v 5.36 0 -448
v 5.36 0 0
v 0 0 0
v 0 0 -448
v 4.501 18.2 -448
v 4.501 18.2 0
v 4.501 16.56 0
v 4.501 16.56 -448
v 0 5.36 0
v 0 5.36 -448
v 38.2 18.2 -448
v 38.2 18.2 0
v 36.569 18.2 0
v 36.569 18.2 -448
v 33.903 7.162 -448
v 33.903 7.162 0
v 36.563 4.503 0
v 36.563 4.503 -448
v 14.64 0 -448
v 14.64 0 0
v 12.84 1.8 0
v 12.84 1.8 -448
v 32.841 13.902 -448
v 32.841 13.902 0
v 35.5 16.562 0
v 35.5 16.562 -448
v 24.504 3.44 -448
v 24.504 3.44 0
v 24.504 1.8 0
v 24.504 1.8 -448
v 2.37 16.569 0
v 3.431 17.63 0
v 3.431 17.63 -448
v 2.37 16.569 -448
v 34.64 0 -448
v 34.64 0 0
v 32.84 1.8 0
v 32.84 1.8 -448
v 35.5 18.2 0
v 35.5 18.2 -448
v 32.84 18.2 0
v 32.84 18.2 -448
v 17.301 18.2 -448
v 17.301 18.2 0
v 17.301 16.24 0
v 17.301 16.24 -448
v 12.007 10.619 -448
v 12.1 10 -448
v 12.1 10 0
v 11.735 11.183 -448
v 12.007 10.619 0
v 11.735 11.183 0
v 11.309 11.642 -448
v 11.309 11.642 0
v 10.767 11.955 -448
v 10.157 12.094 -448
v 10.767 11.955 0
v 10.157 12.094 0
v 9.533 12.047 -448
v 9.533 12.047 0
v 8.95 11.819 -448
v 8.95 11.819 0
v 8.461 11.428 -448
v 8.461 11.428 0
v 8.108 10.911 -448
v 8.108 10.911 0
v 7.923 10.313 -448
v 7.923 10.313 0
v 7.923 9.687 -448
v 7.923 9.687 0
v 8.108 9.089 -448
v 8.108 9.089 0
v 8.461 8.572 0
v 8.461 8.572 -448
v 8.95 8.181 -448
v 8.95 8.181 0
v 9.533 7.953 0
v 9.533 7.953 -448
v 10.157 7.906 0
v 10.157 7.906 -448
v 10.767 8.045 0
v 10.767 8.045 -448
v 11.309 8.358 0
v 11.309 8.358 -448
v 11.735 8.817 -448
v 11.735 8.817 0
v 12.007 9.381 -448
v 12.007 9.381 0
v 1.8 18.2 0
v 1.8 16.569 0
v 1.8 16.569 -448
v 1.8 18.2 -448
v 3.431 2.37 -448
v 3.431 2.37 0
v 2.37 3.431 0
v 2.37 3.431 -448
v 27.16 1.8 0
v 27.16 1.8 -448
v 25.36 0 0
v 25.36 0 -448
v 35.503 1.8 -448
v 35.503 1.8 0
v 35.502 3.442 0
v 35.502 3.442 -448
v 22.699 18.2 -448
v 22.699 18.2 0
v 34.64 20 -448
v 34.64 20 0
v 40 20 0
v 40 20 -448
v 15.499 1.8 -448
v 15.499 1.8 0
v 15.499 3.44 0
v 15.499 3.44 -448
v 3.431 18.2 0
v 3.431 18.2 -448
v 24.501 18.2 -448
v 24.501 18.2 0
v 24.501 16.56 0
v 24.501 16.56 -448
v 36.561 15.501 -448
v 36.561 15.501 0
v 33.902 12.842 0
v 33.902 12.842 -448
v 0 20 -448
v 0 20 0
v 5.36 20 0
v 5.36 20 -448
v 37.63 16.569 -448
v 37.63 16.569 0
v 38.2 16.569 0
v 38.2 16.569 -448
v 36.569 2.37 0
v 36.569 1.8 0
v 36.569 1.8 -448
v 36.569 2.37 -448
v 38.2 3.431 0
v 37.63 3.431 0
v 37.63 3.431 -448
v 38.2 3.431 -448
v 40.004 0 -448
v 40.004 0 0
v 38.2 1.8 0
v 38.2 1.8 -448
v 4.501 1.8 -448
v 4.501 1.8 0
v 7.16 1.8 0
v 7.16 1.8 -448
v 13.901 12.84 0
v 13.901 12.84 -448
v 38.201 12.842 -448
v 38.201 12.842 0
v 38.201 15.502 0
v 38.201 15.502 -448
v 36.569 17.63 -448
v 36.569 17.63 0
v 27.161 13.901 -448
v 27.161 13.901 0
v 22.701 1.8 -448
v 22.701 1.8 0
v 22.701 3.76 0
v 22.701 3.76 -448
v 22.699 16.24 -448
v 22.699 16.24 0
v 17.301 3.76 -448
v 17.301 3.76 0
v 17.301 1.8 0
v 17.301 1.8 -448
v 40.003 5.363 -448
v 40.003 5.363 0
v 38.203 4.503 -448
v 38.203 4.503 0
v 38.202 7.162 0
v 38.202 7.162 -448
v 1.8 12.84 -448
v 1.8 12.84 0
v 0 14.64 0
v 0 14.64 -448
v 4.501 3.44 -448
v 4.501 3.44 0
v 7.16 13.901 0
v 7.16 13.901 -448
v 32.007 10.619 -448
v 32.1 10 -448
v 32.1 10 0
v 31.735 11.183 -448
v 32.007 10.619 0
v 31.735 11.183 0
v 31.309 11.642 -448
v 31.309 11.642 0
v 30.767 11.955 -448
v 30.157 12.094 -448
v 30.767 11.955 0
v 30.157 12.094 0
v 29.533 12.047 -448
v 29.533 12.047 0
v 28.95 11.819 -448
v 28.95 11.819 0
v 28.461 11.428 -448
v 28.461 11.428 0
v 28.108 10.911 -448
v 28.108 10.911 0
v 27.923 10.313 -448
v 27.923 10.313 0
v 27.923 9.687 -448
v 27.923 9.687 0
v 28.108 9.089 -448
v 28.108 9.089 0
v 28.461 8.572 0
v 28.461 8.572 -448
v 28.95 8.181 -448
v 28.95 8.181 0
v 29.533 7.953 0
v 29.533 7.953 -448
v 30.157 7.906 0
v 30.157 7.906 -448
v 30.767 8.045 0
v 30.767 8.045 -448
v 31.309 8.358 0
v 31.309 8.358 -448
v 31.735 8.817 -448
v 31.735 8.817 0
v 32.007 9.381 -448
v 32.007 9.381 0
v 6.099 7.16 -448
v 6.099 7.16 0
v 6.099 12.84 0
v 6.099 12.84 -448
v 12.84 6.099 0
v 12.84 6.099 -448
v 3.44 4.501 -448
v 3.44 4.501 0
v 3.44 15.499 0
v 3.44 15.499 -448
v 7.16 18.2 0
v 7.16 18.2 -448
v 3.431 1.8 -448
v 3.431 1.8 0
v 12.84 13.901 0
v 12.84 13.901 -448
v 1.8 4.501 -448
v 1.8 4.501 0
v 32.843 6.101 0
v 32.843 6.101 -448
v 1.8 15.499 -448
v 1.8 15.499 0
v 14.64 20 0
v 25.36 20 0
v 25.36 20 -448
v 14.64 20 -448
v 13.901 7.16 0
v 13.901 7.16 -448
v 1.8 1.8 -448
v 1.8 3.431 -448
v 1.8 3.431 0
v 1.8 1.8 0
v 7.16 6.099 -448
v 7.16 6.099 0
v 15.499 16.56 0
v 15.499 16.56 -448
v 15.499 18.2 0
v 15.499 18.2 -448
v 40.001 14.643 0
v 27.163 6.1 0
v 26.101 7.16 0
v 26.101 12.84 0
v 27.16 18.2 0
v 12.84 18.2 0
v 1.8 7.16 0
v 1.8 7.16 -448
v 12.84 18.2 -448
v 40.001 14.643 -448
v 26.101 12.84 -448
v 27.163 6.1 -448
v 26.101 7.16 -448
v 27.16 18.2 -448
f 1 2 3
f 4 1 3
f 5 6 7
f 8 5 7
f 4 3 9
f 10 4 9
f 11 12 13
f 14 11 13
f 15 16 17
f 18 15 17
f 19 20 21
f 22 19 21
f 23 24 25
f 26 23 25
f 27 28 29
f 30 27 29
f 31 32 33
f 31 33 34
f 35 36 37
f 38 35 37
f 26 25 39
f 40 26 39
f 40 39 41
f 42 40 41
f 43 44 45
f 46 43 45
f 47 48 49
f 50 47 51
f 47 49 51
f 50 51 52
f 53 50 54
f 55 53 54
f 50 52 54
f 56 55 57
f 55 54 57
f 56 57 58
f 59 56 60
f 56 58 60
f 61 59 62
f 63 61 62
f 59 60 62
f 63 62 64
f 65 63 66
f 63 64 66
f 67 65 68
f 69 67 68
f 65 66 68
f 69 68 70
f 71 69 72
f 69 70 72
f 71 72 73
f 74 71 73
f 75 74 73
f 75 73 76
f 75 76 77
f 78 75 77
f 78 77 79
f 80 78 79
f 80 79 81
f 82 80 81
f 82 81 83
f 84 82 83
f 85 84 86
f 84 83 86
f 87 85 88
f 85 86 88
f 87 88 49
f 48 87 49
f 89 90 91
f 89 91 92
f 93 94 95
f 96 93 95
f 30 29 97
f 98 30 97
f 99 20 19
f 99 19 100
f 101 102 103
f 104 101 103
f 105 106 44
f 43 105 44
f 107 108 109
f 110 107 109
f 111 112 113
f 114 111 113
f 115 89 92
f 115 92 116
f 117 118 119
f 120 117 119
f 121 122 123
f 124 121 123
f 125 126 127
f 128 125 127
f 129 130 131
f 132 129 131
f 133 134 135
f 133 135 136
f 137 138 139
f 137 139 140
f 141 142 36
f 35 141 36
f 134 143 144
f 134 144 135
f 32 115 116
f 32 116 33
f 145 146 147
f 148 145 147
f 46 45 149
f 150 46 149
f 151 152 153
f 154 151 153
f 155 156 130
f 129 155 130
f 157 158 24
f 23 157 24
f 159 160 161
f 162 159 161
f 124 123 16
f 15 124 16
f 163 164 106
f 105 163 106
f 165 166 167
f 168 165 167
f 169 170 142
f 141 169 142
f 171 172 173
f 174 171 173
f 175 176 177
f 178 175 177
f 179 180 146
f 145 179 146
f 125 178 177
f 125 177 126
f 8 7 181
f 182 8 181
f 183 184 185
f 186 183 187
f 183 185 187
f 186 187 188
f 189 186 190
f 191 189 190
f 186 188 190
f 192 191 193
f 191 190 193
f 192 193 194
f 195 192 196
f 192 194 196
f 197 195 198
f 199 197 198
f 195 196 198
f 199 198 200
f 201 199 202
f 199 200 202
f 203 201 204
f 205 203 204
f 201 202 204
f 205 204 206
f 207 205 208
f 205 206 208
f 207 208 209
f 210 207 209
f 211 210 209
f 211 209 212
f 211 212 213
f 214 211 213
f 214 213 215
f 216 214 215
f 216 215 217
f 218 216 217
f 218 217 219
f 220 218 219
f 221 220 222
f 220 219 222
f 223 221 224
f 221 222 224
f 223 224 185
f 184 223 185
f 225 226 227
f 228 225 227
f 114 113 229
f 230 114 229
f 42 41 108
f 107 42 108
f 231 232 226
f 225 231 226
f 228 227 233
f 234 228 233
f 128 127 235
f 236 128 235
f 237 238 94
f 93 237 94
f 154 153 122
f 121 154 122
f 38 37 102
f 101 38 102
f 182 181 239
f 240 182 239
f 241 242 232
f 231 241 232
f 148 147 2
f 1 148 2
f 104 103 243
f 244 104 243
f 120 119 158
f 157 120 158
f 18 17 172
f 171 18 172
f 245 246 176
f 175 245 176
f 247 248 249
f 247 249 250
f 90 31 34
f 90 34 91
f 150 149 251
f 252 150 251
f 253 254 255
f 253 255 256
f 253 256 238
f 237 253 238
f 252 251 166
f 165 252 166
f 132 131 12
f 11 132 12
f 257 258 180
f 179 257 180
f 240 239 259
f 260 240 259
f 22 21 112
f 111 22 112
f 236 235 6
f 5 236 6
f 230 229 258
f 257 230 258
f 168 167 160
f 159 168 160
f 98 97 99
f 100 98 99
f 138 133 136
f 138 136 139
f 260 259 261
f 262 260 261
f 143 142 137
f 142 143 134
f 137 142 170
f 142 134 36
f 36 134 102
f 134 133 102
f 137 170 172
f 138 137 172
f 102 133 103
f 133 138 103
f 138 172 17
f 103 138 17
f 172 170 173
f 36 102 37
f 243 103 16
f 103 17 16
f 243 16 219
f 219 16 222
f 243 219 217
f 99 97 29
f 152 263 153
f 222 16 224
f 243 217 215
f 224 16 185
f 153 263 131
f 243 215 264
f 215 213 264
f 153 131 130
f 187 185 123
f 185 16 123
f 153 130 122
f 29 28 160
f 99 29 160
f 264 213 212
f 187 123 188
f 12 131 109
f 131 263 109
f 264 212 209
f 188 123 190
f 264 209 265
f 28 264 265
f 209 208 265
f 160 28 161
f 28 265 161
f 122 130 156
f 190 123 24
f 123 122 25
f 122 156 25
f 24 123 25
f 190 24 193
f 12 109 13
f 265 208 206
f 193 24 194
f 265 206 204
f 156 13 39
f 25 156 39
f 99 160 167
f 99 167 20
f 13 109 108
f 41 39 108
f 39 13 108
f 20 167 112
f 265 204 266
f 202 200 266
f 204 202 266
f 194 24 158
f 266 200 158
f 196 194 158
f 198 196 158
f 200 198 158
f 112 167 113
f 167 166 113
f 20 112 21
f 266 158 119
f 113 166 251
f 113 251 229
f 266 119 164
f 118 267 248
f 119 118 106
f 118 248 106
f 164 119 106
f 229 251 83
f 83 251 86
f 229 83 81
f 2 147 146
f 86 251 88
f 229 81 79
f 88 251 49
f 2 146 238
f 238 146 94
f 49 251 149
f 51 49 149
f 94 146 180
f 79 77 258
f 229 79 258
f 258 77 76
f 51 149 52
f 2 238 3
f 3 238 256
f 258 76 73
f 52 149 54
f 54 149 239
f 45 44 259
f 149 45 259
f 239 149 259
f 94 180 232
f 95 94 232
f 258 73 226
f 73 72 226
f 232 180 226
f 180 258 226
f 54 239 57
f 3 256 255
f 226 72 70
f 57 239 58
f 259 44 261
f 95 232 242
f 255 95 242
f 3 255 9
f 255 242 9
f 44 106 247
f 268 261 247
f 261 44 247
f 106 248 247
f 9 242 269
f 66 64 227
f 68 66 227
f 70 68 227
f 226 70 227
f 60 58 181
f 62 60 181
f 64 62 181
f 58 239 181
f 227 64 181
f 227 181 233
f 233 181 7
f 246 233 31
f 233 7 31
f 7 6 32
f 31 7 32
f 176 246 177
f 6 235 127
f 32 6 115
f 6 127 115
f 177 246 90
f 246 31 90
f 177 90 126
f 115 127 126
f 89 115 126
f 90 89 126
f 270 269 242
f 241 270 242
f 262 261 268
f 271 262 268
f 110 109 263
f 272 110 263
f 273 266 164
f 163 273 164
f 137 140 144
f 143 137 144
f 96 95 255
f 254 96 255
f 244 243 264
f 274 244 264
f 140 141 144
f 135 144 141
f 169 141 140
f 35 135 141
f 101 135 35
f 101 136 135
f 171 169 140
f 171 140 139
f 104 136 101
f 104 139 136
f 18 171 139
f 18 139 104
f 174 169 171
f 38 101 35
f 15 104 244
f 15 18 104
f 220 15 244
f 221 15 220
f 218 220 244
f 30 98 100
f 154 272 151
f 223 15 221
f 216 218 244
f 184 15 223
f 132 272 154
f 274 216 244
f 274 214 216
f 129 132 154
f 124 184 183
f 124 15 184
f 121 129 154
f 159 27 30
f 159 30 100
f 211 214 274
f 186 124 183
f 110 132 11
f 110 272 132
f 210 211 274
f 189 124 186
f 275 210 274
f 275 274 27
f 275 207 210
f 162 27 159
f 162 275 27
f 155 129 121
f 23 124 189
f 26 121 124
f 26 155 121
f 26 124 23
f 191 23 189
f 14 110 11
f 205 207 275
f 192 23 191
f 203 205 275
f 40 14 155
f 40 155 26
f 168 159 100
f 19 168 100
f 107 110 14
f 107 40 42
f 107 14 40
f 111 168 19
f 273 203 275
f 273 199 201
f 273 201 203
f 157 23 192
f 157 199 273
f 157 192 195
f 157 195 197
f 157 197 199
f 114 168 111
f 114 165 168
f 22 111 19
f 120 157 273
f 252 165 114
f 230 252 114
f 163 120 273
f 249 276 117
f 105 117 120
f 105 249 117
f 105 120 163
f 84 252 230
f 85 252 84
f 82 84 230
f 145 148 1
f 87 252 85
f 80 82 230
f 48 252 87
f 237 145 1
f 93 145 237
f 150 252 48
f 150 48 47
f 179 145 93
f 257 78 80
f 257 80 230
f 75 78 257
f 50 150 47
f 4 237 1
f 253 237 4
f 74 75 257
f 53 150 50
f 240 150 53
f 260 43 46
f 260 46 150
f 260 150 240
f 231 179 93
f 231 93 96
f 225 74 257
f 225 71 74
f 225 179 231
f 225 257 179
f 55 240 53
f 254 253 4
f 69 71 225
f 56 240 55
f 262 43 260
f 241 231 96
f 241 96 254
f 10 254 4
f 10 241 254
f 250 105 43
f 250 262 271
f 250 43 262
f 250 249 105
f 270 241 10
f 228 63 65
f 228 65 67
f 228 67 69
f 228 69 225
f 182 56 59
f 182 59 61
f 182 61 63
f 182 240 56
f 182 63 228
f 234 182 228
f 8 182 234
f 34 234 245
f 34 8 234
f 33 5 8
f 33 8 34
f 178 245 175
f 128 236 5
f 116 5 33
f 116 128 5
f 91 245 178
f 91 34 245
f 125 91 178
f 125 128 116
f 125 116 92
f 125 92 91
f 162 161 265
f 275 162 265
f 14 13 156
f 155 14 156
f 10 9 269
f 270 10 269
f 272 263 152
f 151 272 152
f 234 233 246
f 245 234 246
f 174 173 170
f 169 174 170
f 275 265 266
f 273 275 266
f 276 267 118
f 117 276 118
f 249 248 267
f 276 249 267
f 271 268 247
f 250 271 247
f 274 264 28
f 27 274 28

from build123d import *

# Parameters (mm, degrees)
SKETCH1_R           = 2.1
BOSS_EXTRUDE1_DEPTH = 448


with BuildPart() as part:
    # Sketch1 → Boss-Extrude1 (new body)
    with BuildSketch(Plane.XY):
        Polygon((0, 0), (0, 5.36), (1.8, 7.16), (1.8, 4.500660172), (3.44, 4.500660172), (6.099339828, 7.16), (6.099339828, 12.84), (3.44, 15.499339828), (1.8, 15.499339828), (1.8, 12.84), (0, 14.64), (0, 20), (5.36, 20), (7.16, 18.2), (4.500660172, 18.2), (4.500660172, 16.56), (7.16, 13.900660172), (12.84, 13.900660172), (15.499339828, 16.56), (15.499339828, 18.2), (12.84, 18.2), (14.64, 20), (20, 20), (25.36, 20), (27.16, 18.2), (24.500939946, 18.2), (24.50125838, 16.559689577), (27.161114417, 13.900866058), (32.84111431, 13.901968719), (35.499937829, 16.561824756), (35.49961981, 18.2), (32.84, 18.2), (34.64, 20), (39.999930631, 20), (40.000970647, 14.642698508), (38.201320116, 12.842349107), (38.200803857, 15.501688885), (36.560803888, 15.501370511), (33.901980368, 12.841514474), (33.903083029, 7.161514581), (36.562939066, 4.502691062), (38.202939036, 4.503009436), (38.202422777, 7.162349214), (40.002772178, 5.362698683), (40.003813241, 0), (34.64, 0), (32.84, 1.8), (35.502803549, 1.8), (35.502484821, 3.441825004), (32.842628784, 6.100648523), (27.162628891, 6.099545862), (24.503805372, 3.439689825), (24.504123686, 1.8), (27.16, 1.8), (25.36, 0), (20, 0), (14.64, 0), (12.84, 1.8), (15.499339828, 1.8), (15.499339828, 3.44), (12.84, 6.099339828), (7.16, 6.099339828), (4.500660172, 3.44), (4.500660172, 1.8), (7.16, 1.8), (5.36, 0), align=None)
        with Locations((10, 10)):
            Circle(SKETCH1_R, mode=Mode.SUBTRACT)
        with Locations((30, 10)):
            Circle(SKETCH1_R, mode=Mode.SUBTRACT)
        Polygon((17.300660172, 3.76), (17.300660172, 1.8), (22.700660172, 1.8), (22.700660172, 3.76), (26.100660172, 7.16), (26.100660172, 12.84), (22.699339828, 16.24), (22.699339828, 18.2), (17.300660172, 18.2), (17.300660172, 16.24), (13.900660172, 12.84), (13.900660172, 7.16), align=None, mode=Mode.SUBTRACT)
        Polygon((1.8, 18.2), (3.430660172, 18.2), (3.430660172, 17.63), (2.37, 16.569339828), (1.8, 16.569339828), align=None, mode=Mode.SUBTRACT)
        Polygon((1.8, 3.430660172), (1.8, 1.8), (3.430660172, 1.8), (3.430660172, 2.37), (2.37, 3.430660172), align=None, mode=Mode.SUBTRACT)
        Polygon((38.2, 1.8), (36.569339828, 1.8), (36.569339828, 2.37), (37.63, 3.430660172), (38.2, 3.430660172), align=None, mode=Mode.SUBTRACT)
        Polygon((38.2, 16.569339828), (38.2, 18.2), (36.569339828, 18.2), (36.569339828, 17.63), (37.63, 16.569339828), align=None, mode=Mode.SUBTRACT)
    extrude(amount=-BOSS_EXTRUDE1_DEPTH)


solid = part.part
